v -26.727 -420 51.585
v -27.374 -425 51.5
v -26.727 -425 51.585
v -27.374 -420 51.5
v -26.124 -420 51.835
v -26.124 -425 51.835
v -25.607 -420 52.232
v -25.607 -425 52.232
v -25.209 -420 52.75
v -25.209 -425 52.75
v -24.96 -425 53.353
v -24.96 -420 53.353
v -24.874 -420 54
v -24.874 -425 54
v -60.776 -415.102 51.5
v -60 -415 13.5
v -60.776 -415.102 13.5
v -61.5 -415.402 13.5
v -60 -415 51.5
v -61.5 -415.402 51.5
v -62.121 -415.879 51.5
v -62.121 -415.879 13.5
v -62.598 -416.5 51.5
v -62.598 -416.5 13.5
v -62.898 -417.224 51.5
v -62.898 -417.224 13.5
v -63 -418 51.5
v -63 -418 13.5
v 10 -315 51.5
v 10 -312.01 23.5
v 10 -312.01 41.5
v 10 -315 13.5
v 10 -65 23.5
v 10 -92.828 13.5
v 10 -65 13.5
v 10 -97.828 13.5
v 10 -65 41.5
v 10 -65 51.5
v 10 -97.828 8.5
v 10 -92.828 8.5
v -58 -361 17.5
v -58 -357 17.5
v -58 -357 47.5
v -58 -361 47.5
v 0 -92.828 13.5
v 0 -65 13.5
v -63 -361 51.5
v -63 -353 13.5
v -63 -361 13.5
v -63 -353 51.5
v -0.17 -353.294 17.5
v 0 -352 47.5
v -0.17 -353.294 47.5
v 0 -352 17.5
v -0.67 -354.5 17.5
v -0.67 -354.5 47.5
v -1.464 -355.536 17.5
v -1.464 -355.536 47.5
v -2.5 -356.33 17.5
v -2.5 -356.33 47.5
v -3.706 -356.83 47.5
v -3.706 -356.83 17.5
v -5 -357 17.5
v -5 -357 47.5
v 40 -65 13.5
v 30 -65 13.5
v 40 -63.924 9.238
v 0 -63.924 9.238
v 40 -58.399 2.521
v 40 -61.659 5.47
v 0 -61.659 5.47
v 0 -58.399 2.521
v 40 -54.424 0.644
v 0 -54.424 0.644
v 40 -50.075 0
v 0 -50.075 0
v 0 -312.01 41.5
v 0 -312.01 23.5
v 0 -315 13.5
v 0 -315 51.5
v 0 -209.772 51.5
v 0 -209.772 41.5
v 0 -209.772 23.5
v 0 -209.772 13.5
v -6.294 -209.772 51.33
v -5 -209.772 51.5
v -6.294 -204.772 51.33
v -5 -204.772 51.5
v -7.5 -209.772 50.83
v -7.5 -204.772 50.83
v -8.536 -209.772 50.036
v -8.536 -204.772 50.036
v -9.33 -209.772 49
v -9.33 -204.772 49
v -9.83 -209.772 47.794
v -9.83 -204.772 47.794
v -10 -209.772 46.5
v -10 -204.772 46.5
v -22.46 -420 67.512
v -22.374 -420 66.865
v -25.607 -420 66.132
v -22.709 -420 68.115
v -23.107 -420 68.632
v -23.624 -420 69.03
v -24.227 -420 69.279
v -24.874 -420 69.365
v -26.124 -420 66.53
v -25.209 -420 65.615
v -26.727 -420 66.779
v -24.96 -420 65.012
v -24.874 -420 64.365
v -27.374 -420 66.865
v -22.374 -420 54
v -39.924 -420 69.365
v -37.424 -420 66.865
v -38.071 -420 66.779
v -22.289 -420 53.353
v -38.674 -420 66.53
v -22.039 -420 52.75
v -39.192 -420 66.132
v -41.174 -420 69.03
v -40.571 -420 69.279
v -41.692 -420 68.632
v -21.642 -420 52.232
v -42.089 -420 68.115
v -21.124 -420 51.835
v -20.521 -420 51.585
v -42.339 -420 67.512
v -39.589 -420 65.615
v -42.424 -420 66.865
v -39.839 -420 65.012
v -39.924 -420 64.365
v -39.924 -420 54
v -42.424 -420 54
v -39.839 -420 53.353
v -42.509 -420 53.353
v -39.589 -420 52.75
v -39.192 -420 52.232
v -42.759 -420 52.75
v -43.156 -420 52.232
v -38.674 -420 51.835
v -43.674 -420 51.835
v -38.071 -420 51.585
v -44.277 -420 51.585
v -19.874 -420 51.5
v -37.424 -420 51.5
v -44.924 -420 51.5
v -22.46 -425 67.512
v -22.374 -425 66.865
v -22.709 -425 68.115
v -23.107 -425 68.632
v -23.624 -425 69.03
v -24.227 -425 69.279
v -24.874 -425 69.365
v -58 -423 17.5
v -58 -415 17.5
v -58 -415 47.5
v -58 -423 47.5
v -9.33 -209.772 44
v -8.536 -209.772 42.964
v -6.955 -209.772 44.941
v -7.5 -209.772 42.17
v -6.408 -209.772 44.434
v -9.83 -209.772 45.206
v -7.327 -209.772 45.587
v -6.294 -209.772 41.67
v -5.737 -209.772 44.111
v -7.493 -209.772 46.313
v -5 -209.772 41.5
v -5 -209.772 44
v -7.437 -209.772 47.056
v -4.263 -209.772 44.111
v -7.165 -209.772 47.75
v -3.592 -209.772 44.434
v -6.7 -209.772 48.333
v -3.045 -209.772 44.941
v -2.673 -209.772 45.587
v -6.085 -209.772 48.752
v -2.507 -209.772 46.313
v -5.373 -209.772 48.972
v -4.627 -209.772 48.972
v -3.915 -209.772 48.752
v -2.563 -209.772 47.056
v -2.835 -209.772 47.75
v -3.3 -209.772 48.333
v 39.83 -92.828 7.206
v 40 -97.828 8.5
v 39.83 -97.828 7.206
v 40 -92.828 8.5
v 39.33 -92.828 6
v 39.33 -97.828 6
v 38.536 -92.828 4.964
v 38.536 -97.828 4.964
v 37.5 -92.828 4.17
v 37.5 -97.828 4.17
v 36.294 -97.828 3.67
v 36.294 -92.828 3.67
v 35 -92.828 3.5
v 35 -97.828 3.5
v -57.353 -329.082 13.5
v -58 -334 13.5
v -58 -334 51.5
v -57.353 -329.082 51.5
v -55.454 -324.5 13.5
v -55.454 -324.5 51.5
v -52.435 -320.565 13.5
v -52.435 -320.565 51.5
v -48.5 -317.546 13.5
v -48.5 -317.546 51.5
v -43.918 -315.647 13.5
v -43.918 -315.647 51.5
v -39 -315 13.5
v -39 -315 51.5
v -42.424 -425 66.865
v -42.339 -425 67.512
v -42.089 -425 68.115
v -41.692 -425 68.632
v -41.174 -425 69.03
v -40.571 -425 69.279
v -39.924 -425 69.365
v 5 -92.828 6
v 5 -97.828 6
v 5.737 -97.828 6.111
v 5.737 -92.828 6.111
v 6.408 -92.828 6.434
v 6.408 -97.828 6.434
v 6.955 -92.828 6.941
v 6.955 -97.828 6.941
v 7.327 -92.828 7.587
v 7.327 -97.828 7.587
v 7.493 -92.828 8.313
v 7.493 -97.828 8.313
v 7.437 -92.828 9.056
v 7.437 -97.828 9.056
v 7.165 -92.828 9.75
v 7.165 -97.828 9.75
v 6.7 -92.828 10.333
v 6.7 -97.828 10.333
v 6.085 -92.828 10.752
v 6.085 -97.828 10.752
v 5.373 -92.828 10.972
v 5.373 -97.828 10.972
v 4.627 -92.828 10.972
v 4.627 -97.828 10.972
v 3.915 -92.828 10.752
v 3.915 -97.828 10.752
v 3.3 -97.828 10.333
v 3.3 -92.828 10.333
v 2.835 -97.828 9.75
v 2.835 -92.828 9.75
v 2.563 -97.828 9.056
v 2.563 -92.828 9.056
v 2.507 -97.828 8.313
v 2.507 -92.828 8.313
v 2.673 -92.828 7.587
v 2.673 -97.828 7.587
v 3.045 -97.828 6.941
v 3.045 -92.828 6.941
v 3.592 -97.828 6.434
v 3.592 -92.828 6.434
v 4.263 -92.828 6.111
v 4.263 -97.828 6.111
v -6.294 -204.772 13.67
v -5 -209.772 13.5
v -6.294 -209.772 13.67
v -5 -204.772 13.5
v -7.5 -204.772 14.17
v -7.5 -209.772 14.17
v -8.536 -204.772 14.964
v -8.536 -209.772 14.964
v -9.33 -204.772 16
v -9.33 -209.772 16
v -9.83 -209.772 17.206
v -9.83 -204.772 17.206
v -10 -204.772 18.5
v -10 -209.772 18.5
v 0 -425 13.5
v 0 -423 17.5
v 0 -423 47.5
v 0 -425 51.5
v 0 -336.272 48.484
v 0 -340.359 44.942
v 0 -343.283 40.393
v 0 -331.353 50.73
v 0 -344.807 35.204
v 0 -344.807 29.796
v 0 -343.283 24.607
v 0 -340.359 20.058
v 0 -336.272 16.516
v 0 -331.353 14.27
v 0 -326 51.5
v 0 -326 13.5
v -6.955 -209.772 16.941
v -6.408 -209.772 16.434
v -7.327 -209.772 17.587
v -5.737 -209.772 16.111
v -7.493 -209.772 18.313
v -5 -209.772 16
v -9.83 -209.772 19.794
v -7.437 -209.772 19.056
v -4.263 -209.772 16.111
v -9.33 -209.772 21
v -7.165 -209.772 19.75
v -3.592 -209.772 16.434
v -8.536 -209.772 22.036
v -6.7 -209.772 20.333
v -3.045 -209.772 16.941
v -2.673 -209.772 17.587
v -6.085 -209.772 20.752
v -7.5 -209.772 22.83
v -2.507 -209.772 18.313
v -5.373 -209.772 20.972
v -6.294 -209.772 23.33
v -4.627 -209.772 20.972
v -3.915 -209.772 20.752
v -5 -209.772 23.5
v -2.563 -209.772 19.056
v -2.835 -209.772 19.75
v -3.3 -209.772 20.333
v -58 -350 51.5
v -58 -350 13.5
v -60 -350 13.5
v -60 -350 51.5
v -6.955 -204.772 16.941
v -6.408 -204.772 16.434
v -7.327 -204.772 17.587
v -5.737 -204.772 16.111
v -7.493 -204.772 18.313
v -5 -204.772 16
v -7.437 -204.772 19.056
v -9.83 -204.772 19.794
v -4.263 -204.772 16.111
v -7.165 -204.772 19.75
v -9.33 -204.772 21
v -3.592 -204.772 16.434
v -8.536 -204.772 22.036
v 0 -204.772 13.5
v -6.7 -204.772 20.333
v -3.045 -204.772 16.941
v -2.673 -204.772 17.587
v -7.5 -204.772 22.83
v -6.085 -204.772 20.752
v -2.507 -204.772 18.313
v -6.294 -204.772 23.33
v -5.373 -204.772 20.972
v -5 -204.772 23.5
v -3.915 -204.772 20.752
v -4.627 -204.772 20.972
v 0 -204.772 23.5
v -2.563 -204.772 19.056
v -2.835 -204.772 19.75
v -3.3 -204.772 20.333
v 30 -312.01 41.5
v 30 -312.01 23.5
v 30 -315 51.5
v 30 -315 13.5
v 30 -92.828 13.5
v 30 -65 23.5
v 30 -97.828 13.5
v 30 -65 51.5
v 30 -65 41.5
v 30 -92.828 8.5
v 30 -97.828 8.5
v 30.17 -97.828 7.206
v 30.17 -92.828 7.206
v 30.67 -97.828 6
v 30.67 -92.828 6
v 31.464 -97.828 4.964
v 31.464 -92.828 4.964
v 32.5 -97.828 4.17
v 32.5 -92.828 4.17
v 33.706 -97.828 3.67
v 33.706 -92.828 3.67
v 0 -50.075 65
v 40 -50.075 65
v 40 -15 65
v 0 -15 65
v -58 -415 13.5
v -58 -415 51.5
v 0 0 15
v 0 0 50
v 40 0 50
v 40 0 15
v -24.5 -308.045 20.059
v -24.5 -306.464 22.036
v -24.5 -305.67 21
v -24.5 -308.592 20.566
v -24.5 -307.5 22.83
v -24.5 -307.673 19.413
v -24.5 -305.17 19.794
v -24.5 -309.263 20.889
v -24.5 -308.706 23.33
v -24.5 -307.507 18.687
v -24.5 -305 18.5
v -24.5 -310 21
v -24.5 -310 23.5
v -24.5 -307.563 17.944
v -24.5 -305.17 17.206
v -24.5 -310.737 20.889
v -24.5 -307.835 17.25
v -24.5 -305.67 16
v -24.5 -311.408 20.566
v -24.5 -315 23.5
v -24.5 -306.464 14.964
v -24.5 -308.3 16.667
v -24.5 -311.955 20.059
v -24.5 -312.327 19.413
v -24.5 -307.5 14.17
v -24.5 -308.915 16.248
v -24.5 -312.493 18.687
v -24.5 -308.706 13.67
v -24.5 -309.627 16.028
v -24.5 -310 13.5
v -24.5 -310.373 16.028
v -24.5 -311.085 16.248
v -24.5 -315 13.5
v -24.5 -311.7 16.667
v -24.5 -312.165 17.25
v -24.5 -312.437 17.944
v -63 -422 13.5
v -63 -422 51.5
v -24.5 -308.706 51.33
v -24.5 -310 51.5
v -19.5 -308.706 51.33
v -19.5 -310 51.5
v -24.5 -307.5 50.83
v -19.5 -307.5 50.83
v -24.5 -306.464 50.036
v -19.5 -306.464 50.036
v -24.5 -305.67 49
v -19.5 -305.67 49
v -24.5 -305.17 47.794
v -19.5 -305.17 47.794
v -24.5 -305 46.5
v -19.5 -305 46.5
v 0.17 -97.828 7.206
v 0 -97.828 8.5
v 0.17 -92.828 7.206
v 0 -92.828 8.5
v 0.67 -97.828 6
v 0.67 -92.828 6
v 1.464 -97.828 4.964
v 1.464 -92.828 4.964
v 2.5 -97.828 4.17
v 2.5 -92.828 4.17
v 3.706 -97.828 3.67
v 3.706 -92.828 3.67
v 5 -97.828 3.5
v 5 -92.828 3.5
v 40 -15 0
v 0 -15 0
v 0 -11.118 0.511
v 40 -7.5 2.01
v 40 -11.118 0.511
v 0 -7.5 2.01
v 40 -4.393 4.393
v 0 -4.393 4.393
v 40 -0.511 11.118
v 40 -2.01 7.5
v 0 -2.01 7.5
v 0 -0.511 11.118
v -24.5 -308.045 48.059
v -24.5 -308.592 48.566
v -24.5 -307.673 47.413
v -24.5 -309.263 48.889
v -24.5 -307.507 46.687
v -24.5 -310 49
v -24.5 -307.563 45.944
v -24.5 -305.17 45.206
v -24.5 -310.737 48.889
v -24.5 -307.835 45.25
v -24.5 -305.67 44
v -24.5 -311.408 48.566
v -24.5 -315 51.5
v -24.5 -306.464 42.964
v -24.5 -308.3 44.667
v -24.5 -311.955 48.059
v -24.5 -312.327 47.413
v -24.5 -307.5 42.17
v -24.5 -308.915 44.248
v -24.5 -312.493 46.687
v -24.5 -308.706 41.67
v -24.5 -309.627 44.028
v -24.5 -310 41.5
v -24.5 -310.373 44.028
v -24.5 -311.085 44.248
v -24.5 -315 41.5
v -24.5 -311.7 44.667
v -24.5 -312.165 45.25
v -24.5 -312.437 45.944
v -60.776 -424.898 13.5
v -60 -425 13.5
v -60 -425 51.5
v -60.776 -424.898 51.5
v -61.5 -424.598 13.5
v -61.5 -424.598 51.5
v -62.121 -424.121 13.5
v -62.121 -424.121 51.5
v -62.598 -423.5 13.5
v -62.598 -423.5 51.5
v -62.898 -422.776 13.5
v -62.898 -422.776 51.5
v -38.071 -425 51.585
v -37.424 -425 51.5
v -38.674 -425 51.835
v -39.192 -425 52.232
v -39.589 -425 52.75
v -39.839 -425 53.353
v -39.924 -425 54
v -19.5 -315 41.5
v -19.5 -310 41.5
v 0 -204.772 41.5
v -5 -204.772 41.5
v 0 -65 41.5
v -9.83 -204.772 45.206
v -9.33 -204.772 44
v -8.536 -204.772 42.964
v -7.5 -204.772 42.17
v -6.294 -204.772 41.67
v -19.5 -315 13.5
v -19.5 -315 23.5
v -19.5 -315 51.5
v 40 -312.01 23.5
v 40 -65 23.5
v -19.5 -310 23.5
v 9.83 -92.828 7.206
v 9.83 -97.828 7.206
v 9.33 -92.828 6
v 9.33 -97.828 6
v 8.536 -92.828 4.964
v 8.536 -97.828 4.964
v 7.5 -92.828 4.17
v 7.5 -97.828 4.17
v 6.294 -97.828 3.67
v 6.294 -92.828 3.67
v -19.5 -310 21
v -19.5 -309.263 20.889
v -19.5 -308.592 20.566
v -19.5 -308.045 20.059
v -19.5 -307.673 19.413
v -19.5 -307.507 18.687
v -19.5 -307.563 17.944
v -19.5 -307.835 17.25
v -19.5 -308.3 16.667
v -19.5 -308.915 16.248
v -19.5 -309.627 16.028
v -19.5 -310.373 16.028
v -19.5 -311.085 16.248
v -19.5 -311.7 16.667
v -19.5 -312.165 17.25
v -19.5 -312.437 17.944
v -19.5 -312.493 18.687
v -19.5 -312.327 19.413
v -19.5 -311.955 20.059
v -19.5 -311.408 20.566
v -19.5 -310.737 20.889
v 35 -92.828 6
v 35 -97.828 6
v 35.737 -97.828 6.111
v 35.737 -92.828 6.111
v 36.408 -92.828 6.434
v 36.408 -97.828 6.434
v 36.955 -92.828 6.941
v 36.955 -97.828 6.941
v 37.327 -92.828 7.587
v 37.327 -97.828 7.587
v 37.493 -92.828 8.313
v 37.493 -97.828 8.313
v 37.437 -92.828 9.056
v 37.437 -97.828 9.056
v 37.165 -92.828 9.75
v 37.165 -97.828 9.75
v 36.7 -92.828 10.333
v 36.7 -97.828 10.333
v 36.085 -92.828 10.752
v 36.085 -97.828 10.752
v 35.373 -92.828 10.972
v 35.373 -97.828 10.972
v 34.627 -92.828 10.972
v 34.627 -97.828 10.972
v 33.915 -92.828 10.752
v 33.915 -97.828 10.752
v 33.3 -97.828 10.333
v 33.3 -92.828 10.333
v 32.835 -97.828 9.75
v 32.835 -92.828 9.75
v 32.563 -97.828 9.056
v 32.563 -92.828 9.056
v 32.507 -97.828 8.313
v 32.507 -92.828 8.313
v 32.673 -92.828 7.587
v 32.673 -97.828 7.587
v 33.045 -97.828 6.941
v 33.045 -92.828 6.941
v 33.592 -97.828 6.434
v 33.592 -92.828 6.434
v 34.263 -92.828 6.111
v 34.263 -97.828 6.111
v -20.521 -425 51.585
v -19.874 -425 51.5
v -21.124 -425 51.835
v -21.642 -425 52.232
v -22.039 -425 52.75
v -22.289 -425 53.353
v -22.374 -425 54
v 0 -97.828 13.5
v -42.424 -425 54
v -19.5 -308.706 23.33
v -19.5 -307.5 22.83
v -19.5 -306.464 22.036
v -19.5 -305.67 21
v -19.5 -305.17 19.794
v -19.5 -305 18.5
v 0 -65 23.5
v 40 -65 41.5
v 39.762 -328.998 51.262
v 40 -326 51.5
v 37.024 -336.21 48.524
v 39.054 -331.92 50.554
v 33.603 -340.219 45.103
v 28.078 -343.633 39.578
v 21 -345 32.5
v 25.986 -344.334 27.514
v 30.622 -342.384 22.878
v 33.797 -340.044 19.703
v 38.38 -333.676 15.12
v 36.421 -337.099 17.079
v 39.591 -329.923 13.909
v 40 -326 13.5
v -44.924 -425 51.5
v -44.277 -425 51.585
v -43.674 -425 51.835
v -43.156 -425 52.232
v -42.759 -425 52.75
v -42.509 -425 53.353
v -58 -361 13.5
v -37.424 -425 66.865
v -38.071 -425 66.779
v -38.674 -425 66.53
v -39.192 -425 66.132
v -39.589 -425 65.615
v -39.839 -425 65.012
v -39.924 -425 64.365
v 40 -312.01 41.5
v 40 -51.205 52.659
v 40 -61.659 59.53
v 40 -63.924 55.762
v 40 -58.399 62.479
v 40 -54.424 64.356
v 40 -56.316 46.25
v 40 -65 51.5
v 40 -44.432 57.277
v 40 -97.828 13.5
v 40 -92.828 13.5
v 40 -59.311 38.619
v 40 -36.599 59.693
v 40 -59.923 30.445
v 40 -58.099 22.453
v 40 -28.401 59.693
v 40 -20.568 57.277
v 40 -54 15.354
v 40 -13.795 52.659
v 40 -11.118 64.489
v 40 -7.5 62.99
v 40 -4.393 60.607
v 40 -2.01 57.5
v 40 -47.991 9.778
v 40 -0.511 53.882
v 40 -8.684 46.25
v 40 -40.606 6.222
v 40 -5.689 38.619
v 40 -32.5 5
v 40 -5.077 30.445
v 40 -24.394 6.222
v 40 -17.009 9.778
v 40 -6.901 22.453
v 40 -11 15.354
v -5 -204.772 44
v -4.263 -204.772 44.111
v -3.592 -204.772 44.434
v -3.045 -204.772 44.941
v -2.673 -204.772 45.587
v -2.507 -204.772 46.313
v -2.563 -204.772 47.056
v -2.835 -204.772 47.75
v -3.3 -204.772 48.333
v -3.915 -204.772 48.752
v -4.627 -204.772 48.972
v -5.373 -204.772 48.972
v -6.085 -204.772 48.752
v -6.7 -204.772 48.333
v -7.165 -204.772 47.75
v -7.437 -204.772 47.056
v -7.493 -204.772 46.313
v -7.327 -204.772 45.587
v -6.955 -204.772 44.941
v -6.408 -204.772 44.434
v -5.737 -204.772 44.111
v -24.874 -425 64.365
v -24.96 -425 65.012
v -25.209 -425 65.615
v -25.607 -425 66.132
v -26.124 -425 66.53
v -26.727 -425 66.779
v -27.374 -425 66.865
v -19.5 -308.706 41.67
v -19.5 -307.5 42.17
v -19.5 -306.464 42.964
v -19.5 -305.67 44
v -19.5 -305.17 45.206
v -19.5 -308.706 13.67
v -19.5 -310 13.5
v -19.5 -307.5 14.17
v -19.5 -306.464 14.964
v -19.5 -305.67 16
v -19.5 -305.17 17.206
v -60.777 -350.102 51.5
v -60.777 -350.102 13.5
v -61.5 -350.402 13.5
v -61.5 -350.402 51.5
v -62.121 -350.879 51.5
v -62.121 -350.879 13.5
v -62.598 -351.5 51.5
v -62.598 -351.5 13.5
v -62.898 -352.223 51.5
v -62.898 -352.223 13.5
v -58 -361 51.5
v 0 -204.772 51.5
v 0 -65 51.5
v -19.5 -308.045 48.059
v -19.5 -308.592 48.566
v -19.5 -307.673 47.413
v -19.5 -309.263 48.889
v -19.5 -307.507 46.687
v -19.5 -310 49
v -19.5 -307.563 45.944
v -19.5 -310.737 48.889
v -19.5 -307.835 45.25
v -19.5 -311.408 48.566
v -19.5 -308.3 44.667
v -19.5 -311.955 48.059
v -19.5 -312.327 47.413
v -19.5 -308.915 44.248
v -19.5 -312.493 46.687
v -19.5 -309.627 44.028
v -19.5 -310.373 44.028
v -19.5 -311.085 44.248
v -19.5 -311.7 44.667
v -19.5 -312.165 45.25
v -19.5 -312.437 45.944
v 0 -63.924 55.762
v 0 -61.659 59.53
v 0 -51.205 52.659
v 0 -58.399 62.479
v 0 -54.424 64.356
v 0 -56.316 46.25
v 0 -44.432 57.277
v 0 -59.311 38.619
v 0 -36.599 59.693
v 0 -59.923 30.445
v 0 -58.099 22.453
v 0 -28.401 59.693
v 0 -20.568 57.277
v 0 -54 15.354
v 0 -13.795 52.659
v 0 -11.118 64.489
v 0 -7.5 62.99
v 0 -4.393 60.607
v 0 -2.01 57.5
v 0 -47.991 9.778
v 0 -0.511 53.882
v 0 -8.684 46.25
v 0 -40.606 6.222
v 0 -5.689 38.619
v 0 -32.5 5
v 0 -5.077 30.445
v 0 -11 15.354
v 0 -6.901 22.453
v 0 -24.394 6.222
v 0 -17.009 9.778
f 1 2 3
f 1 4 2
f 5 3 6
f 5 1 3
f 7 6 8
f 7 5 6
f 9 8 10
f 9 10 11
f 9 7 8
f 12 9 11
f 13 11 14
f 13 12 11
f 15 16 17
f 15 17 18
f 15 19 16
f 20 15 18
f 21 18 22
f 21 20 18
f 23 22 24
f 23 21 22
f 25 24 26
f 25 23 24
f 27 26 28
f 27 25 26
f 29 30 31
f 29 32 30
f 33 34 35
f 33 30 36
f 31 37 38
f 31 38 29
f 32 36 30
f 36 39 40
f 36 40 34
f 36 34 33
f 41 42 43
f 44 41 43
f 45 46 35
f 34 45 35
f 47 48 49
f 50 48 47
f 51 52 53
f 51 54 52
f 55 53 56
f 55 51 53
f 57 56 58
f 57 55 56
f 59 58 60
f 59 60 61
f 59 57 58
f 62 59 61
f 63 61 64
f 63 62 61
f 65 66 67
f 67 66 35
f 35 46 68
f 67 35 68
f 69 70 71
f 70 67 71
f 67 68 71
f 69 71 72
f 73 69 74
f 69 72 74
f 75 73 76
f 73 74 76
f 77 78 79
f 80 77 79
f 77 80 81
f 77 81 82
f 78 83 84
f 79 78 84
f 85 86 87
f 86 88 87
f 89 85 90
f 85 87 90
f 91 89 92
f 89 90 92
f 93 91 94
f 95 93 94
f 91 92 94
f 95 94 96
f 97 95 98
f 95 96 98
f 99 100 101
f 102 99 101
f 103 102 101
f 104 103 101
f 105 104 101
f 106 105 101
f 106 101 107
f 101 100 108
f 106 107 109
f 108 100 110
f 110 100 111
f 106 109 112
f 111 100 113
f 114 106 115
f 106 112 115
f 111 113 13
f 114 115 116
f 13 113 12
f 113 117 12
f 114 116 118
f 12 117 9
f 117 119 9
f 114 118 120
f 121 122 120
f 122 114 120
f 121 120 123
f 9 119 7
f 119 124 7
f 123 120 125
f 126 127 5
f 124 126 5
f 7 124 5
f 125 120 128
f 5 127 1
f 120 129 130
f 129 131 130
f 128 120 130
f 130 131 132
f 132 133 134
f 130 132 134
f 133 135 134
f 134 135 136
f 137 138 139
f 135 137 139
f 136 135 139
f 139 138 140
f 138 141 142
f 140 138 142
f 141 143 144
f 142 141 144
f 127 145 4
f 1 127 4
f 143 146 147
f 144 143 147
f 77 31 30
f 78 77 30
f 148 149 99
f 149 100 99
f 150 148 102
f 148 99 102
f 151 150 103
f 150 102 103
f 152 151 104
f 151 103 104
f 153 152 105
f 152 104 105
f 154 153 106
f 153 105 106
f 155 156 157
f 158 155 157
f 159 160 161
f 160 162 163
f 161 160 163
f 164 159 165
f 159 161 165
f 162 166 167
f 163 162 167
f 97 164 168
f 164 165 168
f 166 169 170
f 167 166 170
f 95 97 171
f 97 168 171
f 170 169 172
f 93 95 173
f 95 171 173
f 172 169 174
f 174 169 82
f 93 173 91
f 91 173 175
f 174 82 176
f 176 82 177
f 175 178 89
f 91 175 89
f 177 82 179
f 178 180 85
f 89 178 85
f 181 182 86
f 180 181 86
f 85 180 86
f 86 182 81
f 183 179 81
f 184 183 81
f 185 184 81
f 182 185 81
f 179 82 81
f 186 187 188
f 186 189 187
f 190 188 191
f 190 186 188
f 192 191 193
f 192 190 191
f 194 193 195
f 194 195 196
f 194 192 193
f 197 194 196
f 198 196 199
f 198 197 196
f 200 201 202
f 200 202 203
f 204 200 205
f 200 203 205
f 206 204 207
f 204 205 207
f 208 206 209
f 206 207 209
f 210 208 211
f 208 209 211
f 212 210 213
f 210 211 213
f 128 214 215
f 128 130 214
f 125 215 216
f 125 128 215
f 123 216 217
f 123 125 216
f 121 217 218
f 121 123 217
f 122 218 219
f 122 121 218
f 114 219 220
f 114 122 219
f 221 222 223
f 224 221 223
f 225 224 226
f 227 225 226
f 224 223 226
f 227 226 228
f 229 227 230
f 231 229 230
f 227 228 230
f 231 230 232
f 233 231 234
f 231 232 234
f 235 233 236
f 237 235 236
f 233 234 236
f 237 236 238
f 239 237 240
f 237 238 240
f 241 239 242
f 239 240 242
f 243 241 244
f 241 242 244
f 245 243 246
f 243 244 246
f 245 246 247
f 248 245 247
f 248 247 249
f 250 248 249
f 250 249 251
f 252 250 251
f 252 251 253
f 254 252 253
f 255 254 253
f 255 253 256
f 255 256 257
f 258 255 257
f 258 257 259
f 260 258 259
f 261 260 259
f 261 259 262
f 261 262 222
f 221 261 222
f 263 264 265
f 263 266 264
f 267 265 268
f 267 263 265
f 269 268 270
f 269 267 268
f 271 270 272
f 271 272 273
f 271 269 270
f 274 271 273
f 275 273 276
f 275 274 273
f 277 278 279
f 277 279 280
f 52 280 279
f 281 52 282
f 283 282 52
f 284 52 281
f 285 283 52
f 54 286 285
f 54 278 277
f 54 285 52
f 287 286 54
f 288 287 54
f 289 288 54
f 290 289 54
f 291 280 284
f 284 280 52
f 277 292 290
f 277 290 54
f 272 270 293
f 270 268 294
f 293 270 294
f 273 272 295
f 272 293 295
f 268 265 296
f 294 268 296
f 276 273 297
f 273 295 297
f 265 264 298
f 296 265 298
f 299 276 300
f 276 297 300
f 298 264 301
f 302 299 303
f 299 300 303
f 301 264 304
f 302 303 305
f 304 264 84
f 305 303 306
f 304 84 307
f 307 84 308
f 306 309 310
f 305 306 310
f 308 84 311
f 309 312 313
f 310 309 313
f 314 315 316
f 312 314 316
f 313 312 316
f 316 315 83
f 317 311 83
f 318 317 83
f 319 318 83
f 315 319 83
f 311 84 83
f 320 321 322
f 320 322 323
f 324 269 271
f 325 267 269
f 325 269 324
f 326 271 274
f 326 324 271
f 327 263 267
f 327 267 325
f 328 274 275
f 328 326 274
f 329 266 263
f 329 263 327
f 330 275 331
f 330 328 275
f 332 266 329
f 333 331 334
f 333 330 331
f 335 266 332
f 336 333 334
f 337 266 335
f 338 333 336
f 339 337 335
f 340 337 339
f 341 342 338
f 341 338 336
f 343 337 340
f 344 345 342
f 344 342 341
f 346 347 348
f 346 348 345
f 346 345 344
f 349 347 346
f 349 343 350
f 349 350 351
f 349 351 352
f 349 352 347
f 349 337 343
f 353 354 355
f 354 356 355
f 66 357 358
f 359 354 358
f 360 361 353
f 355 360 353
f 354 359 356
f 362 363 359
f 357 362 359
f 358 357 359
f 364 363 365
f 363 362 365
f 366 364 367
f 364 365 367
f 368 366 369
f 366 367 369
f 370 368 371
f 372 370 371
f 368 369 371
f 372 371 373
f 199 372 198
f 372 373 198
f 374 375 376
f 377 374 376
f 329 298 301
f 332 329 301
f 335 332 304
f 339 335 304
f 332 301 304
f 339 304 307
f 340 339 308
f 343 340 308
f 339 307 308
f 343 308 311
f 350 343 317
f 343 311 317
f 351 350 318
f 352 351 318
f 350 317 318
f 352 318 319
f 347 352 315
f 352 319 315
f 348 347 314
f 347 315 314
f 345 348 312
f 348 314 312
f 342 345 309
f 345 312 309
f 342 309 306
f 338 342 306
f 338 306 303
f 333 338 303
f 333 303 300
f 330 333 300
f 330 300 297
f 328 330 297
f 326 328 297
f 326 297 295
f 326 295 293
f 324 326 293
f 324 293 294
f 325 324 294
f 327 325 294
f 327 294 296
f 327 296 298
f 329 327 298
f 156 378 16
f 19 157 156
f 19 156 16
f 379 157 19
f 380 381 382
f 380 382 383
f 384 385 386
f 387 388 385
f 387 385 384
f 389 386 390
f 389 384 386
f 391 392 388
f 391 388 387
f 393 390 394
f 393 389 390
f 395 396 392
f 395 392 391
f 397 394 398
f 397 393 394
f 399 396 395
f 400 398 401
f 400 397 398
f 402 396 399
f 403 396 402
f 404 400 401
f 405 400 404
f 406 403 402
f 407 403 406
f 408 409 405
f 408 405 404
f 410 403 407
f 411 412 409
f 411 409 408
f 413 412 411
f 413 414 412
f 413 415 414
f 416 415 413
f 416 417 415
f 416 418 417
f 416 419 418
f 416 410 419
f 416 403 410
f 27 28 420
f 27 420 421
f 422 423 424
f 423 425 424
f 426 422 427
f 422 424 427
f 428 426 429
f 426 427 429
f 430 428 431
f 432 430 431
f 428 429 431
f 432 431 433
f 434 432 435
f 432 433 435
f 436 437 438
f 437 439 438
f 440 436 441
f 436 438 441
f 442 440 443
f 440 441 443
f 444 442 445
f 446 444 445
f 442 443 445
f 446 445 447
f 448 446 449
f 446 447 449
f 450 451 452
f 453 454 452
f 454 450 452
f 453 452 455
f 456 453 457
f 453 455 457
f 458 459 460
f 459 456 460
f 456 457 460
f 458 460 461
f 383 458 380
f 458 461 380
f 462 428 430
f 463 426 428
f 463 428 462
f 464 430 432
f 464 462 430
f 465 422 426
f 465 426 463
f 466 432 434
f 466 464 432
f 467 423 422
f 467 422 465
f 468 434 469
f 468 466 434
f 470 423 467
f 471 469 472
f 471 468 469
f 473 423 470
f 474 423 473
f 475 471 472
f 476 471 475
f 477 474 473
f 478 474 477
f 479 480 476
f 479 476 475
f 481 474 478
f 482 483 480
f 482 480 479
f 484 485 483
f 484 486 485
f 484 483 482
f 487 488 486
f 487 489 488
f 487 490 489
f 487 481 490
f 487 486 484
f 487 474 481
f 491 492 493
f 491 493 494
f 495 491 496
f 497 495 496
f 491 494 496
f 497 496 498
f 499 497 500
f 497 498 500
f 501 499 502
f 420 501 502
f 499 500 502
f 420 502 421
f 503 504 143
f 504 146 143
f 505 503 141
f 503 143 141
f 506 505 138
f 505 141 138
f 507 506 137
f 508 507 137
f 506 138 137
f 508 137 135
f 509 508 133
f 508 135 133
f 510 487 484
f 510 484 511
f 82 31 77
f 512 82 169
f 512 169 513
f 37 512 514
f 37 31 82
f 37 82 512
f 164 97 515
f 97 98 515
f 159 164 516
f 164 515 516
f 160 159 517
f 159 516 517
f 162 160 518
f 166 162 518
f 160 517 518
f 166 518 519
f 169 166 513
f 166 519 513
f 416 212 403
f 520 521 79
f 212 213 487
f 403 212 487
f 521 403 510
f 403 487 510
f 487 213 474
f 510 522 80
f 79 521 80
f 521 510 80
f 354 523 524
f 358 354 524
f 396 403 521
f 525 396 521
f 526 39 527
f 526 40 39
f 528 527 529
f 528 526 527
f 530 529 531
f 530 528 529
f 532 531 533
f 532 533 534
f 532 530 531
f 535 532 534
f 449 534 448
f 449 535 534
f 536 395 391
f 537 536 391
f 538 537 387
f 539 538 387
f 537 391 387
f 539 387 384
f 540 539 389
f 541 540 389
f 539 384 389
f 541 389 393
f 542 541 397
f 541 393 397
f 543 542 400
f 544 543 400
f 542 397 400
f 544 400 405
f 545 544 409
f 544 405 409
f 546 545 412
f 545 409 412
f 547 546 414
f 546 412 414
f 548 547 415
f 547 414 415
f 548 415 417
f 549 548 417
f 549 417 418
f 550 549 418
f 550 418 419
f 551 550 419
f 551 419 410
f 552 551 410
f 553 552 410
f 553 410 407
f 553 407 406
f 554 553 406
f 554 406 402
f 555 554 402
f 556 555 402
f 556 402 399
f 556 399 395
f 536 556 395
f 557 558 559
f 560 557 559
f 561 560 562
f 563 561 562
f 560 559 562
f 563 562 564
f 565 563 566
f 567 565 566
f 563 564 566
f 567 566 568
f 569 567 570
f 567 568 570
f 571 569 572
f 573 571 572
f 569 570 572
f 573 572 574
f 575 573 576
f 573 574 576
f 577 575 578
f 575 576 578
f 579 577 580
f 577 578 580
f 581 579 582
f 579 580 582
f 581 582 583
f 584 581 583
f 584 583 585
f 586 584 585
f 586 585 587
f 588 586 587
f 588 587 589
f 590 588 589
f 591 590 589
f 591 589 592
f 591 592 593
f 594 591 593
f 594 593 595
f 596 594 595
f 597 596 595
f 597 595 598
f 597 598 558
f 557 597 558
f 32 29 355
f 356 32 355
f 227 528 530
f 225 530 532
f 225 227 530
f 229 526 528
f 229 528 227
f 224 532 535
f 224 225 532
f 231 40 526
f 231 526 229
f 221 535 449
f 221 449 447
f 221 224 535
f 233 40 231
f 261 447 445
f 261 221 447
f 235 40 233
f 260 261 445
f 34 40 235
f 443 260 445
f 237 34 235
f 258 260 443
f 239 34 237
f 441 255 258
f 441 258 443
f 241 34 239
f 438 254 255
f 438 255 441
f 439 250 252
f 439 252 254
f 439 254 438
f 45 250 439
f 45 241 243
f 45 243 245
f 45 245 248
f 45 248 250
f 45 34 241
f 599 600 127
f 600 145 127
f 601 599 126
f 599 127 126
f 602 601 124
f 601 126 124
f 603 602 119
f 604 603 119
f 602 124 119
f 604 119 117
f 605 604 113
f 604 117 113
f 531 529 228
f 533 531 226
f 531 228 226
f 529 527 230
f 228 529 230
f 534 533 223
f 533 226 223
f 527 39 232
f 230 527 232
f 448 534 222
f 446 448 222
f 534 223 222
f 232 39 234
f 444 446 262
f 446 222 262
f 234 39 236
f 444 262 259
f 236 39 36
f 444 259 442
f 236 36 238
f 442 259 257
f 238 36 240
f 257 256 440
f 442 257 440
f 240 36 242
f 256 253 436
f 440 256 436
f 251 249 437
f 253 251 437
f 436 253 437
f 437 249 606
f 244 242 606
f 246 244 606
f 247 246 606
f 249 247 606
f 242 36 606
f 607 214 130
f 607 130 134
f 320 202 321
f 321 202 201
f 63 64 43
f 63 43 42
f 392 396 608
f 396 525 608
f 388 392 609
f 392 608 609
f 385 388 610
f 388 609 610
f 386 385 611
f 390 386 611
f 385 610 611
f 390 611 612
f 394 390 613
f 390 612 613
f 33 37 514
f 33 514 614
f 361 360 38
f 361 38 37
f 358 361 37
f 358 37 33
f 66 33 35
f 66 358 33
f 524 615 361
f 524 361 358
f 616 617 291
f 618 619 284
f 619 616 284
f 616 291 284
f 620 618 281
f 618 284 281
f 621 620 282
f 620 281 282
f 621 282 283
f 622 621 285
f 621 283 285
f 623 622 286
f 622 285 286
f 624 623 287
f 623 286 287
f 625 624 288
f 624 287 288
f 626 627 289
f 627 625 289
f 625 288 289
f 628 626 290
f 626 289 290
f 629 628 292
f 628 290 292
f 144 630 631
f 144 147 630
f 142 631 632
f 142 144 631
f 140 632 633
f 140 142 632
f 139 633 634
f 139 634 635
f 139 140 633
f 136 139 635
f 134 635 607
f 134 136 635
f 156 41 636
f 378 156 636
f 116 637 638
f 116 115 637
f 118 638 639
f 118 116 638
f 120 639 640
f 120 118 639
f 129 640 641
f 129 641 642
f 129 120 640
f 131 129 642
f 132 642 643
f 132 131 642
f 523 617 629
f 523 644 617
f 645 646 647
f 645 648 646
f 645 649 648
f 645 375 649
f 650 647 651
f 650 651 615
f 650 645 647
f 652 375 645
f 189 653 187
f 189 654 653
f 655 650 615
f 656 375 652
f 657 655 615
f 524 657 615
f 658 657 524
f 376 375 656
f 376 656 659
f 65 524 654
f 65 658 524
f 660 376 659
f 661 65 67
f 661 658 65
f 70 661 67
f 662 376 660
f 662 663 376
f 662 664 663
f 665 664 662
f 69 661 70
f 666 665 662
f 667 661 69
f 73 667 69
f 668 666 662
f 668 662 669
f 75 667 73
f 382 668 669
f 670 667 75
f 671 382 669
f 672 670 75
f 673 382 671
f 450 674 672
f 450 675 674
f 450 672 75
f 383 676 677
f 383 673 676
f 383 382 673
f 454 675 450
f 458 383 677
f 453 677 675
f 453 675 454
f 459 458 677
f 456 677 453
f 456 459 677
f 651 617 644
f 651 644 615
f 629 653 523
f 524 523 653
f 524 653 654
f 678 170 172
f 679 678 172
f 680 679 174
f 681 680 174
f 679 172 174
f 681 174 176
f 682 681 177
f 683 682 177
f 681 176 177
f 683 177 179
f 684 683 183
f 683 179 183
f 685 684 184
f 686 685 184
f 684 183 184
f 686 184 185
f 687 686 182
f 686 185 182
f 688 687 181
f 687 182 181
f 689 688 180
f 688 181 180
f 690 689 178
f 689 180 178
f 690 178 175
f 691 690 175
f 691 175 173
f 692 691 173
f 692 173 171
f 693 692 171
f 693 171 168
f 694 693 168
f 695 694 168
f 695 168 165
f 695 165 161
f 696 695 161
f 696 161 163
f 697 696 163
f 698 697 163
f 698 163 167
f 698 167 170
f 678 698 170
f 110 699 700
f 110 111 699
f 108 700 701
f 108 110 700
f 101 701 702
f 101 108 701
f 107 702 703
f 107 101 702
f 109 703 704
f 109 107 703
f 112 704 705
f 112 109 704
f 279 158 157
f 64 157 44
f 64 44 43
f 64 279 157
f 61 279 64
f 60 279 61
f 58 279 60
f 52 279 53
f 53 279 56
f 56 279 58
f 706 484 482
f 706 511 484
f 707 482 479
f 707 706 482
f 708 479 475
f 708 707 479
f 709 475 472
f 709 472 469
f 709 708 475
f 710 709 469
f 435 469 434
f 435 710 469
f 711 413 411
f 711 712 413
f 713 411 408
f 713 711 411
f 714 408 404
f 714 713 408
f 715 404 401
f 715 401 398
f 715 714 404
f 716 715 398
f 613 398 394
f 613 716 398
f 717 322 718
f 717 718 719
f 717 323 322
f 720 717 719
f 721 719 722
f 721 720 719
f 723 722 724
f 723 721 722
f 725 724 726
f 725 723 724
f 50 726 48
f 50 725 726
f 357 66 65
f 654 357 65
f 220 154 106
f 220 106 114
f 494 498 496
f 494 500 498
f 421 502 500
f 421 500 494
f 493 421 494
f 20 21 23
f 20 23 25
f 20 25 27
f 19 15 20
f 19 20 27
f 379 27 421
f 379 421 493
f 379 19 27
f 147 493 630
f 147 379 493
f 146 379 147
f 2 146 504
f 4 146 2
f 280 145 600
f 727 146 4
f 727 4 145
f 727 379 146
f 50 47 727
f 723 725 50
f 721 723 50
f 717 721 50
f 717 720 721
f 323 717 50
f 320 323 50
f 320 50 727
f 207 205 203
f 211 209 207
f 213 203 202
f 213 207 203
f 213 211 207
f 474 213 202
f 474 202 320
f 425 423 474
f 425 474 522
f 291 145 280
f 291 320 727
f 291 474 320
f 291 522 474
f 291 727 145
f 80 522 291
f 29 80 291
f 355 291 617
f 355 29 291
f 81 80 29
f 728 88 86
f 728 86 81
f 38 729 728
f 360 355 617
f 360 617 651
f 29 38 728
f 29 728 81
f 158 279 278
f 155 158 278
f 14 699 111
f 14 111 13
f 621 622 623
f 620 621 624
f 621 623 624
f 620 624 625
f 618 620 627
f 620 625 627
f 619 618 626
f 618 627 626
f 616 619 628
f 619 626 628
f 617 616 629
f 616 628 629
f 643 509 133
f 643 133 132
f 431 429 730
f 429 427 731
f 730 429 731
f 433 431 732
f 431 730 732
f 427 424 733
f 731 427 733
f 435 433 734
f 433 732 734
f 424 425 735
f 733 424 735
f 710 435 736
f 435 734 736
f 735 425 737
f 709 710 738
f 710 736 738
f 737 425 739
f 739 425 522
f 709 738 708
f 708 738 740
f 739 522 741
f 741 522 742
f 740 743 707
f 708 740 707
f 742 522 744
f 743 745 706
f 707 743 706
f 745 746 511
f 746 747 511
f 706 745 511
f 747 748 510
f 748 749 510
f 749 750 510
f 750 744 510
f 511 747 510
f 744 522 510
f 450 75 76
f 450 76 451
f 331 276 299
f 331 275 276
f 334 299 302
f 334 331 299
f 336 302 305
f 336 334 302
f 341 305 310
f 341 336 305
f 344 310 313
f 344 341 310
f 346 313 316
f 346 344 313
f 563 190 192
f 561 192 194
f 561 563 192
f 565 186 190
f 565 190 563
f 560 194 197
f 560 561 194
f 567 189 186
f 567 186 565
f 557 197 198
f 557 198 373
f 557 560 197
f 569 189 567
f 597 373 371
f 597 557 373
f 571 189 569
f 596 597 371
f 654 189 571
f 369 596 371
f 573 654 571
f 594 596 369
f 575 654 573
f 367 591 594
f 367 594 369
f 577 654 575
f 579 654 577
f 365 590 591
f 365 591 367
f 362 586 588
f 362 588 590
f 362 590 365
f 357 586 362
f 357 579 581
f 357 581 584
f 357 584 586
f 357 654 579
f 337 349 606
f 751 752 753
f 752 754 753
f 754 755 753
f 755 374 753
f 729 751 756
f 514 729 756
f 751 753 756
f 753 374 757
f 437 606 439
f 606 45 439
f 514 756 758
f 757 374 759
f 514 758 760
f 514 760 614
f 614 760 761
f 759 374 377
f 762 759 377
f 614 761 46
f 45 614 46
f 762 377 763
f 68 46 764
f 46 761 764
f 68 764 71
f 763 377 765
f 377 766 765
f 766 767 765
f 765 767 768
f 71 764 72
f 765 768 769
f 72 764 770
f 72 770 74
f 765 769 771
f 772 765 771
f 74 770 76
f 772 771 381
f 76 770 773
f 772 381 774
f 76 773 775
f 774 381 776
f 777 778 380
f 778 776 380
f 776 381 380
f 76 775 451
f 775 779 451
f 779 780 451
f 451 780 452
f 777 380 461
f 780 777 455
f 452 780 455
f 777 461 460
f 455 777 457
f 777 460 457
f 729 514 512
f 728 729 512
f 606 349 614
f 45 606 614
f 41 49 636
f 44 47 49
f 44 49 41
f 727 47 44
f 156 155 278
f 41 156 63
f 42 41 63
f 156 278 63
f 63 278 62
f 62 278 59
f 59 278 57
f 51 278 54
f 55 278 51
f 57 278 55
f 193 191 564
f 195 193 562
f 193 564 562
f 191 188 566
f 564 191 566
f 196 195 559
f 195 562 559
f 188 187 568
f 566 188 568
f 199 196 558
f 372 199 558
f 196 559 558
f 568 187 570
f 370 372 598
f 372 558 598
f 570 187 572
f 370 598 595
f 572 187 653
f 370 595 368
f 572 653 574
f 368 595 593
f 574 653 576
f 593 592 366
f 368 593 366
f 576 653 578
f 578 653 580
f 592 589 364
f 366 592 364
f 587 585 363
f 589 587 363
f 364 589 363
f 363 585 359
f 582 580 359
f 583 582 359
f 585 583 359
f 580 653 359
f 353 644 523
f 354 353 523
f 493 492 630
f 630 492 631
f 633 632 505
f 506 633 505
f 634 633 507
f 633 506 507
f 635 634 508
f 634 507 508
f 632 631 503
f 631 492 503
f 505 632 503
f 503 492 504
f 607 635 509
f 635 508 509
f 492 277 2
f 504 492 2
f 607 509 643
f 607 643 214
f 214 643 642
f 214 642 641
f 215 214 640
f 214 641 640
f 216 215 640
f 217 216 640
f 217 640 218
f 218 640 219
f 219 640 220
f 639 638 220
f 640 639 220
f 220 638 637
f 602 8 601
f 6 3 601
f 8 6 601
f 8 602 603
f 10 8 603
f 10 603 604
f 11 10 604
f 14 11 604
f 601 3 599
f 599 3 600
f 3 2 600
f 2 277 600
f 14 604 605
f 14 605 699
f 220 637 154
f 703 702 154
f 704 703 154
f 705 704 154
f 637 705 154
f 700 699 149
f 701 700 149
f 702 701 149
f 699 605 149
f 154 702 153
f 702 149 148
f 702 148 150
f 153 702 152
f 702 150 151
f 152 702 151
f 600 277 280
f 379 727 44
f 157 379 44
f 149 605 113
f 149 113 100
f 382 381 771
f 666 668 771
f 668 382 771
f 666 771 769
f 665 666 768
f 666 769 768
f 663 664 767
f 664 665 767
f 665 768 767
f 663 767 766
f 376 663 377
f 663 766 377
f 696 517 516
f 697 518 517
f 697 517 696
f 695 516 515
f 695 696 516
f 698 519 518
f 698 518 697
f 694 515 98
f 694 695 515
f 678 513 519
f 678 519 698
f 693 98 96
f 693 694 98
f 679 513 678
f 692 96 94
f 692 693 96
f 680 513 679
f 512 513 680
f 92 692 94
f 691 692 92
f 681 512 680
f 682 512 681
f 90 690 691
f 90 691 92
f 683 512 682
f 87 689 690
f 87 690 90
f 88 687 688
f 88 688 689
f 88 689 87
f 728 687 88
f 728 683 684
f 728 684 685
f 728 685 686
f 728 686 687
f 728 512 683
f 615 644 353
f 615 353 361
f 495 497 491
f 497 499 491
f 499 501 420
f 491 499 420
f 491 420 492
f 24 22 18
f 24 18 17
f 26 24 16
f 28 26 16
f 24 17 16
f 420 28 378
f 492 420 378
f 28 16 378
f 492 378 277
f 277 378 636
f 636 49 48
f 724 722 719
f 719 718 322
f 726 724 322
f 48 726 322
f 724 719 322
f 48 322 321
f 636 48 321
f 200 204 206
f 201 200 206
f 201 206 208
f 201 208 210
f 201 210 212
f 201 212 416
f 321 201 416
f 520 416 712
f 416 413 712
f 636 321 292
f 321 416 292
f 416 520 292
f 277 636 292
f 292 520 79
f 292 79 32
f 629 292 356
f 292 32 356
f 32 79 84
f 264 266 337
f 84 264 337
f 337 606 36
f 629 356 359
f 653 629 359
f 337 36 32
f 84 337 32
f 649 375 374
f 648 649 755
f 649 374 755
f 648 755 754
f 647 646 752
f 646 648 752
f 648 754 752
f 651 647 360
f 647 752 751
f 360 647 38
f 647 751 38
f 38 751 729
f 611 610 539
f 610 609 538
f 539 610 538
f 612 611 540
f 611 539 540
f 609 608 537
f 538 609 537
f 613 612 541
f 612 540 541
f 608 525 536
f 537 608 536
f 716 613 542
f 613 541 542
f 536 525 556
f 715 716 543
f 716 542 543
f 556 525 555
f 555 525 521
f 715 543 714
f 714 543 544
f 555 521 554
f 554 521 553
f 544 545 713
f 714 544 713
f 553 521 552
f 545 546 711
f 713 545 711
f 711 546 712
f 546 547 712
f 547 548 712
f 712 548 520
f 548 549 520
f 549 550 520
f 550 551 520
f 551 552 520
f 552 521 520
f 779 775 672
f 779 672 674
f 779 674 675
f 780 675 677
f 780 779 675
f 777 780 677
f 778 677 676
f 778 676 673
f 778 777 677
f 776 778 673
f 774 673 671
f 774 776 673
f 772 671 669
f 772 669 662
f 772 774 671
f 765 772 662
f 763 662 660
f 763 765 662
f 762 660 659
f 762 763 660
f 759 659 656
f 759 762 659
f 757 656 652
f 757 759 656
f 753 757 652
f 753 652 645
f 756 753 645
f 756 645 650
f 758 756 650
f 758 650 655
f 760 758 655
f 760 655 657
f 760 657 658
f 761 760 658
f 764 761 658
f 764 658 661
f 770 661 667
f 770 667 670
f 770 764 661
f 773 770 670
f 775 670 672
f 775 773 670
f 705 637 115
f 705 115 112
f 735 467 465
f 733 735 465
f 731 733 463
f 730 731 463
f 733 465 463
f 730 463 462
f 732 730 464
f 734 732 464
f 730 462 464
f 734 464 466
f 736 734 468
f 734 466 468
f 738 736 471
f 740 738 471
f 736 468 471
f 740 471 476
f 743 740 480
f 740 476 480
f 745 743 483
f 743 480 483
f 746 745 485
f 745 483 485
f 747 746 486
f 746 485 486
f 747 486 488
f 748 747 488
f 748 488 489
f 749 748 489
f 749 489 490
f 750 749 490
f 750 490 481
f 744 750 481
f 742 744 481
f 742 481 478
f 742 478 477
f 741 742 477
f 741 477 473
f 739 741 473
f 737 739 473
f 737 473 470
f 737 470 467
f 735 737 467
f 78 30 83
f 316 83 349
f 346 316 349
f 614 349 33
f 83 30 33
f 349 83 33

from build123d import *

# Parameters (mm, degrees)
SKETCH1_W              = 65
SKETCH1_H              = 65
SKETCH1_R              = 27.5
SKETCH1_W_2            = 38
SKETCH1_H_2            = 280
BOSS_EXTRUDE1_DEPTH    = 40
FILLET1_R              = 15
SKETCH2_W              = 58
SKETCH2_H              = 100
BOSS_EXTRUDE2_DEPTH    = 38
FILLET2_R              = 19
SKETCH3_W              = 20
SKETCH3_H              = 250
CUT_EXTRUDE1_DEPTH     = 38
SKETCH4_W              = 18
SKETCH4_H              = 247.009867417
CUT_EXTRUDE2_DEPTH     = 92
SKETCH5_W              = 28
SKETCH5_H              = 60
CUT_EXTRUDE3_DEPTH     = 58
SKETCH6_W              = 38
SKETCH6_H              = 3
BOSS_EXTRUDE11_DEPTH   = 5
BOSS_EXTRUDE11_2_DEPTH = 5
FILLET3_R              = 3
FILLET4_R              = 3
SKETCH7_W              = 10
SKETCH7_H              = 5
BOSS_EXTRUDE14_DEPTH   = 10
SKETCH8_R              = 2.5
CUT_EXTRUDE4_DEPTH     = 10
FILLET5_R              = 5
SKETCH9_W              = 10
SKETCH9_H              = 5
BOSS_EXTRUDE15_DEPTH   = 10
FILLET6_R              = 5
SKETCH10_R             = 2.5
CUT_EXTRUDE5_DEPTH     = 10
SKETCH11_W             = 5
SKETCH11_H             = 10
BOSS_EXTRUDE16_DEPTH   = 10
FILLET7_R              = 5
SKETCH12_R             = 2.5
CUT_EXTRUDE7_DEPTH     = 10
FILLET9_R              = 2
SKETCH13_W             = 35.831314296
SKETCH13_H             = 60.586089769
CUT_EXTRUDE8_DEPTH     = 10
SKETCH14_W             = 58
SKETCH14_H             = 38
CUT_EXTRUDE9_DEPTH     = 70
SKETCH15_W             = 58
SKETCH15_H             = 38
BOSS_EXTRUDE17_DEPTH   = 80
SKETCH16_W             = 34
SKETCH16_H             = 70
CUT_EXTRUDE10_DEPTH    = 58
SKETCH17_W             = 5
SKETCH17_H             = 38
BOSS_EXTRUDE18_DEPTH   = 5
SKETCH18_W             = 38
SKETCH18_H             = 10
BOSS_EXTRUDE19_DEPTH   = 5
FILLET10_R             = 3
FILLET11_R             = 5
SKETCH19_W             = 2
SKETCH19_H             = 75
BOSS_EXTRUDE22_DEPTH   = 58
SKETCH26_W             = 30
SKETCH26_H             = 9
BOSS_EXTRUDE23_DEPTH   = 58
FILLET12_R             = 5
SKETCH27_W             = 5
SKETCH27_H             = 38
BOSS_EXTRUDE24_DEPTH   = 3
BOSS_EXTRUDE26_DEPTH   = 5
FILLET13_R             = 2.5
FILLET14_R             = 2.5


# Some blends are built 0.0001 mm under size
with BuildPart() as part:
    # Sketch1 → Boss-Extrude1 (new body)
    # profile 1 of 2: a face of its own
    with BuildSketch(Plane(origin=(0, 0, 0), x_dir=(0, 0, -1), z_dir=(1, 0, 0))):
        with Locations((-32.5, -32.5)):
            Rectangle(SKETCH1_W, SKETCH1_H)
        with Locations((-32.5, -32.5)):
            Circle(SKETCH1_R, mode=Mode.SUBTRACT)
    # profile 2 of 2: a face of its own
    with BuildSketch(Plane(origin=(0, 0, 0), x_dir=(0, 0, -1), z_dir=(1, 0, 0))):
        with Locations((-32.5, -205)):
            Rectangle(SKETCH1_W_2, SKETCH1_H_2)
    extrude(amount=BOSS_EXTRUDE1_DEPTH)

    # Fillet1
    # the kernel refuses this fillet: 15 mm, written as the material it takes off along each edge
    with BuildSketch(Plane(origin=(-37.312028891, -65, 0), x_dir=(0, 1, 0), z_dir=(1, 0, 0))) as fillet1_piece_1:
        with BuildLine():
            CenterArc((14.924811557, 15), FILLET1_R, 185.739170477, 84.260829523)
            Line((0, 13.5), (-0.298496231, 13.47))
            ThreePointArc((-0.298496231, 13.47), (-0.3, 6.75), (-0.3, 0))
            Line((-0.3, 0), (0, -0.3))
            Line((0, -0.3), (14.924811557, -0.3))
            Line((14.924811557, -0.3), (14.924811557, 0))
        make_face()
    extrude(amount=114.624057783, mode=Mode.SUBTRACT)
    with BuildSketch(Plane(origin=(-37.312028891, -65, 65), x_dir=(0, 1, 0), z_dir=(1, 0, 0))) as fillet1_piece_2:
        with BuildLine():
            CenterArc((14.924811557, -15), FILLET1_R, 90, 84.260829523)
            Line((0, -13.5), (-0.298496231, -13.47))
            ThreePointArc((-0.298496231, -13.47), (-0.3, -6.75), (-0.3, 0))
            Line((-0.3, 0), (0, 0.3))
            Line((0, 0.3), (14.924811557, 0.3))
            Line((14.924811557, 0.3), (14.924811557, 0))
        make_face()
    extrude(amount=114.624057783, mode=Mode.SUBTRACT)
    with BuildSketch(Plane(origin=(-37.5, 0, 0), x_dir=(0, 0, 1), z_dir=(1, 0, 0))) as fillet1_piece_3:
        with BuildLine():
            CenterArc((FILLET1_R, FILLET1_R), FILLET1_R, 180, 90)
            Line((0, FILLET1_R), (-FILLET1_R * 0.02, FILLET1_R))
            Line((-FILLET1_R * 0.02, FILLET1_R), (-FILLET1_R * 0.02, -FILLET1_R * 0.02))
            Line((-FILLET1_R * 0.02, -FILLET1_R * 0.02), (FILLET1_R, -FILLET1_R * 0.02))
            Line((FILLET1_R, -FILLET1_R * 0.02), (FILLET1_R, 0))
        make_face()
    extrude(amount=115, mode=Mode.SUBTRACT)
    with BuildSketch(Plane(origin=(-37.5, 0, 65), x_dir=(0, 0, -1), z_dir=(1, 0, 0))) as fillet1_piece_4:
        with BuildLine():
            CenterArc((FILLET1_R, -FILLET1_R), FILLET1_R, 90, 90)
            Line((0, -FILLET1_R), (-FILLET1_R * 0.02, -FILLET1_R))
            Line((-FILLET1_R * 0.02, -FILLET1_R), (-FILLET1_R * 0.02, FILLET1_R * 0.02))
            Line((-FILLET1_R * 0.02, FILLET1_R * 0.02), (FILLET1_R, FILLET1_R * 0.02))
            Line((FILLET1_R, FILLET1_R * 0.02), (FILLET1_R, 0))
        make_face()
    extrude(amount=115, mode=Mode.SUBTRACT)

    # Sketch2 → Boss-Extrude2 (add)
    with BuildSketch(Plane.XY.offset(51.5)):
        with Locations((-29, -365)):
            Rectangle(SKETCH2_W, SKETCH2_H)
    extrude(amount=-BOSS_EXTRUDE2_DEPTH)

    # Fillet2
    # the kernel refuses this fillet: 19 mm, written as the material it adds along each edge
    # the kernel refuses this fillet: 19 mm, written as the material it takes off along each edge
    with BuildSketch(Plane(origin=(0, -345, 13.5), x_dir=(0, 1, 0), z_dir=(1, 0, 0))) as fillet2_2_piece_1:
        with BuildLine():
            CenterArc((FILLET2_R, FILLET2_R), FILLET2_R, 180, 90)
            Line((0, FILLET2_R), (0, 0))
            Line((0, 0), (FILLET2_R, 0))
        make_face()
    extrude(amount=87.5, mode=Mode.SUBTRACT)
    with BuildSketch(Plane(origin=(0, -345, 51.5), x_dir=(0, 1, 0), z_dir=(1, 0, 0))) as fillet2_2_piece_2:
        with BuildLine():
            CenterArc((FILLET2_R, -FILLET2_R), FILLET2_R, 90, 90)
            Line((0, -FILLET2_R), (0, 0))
            Line((0, 0), (FILLET2_R, 0))
        make_face()
    extrude(amount=87.5, mode=Mode.SUBTRACT)
    with BuildSketch(Plane(origin=(40, -345, -34), x_dir=(0, 1, 0), z_dir=(0, 0, 1)), Plane(origin=(-58, -315, 99), x_dir=(1, 0, 0), z_dir=(0, 0, -1))) as fillet2_2_piece_3:
        with BuildLine():
            CenterArc((FILLET2_R, FILLET2_R), FILLET2_R, 180, 90)
            Line((0, FILLET2_R), (0, 0))
            Line((0, 0), (FILLET2_R, 0))
        make_face()
    extrude(amount=133, mode=Mode.SUBTRACT)

    # Sketch3 → Cut-Extrude1 (cut)
    with BuildSketch(Plane.XY.offset(51.5)):
        with Locations((20, -190)):
            Rectangle(SKETCH3_W, SKETCH3_H)
    extrude(amount=-CUT_EXTRUDE1_DEPTH, mode=Mode.SUBTRACT)

    # Sketch4 → Cut-Extrude2 (cut)
    with BuildSketch(Plane(origin=(40, 0, 0), x_dir=(0, 0, -1), z_dir=(1, 0, 0))):
        with Locations((-32.5, -188.504933709)):
            Rectangle(SKETCH4_W, SKETCH4_H)
    extrude(amount=-CUT_EXTRUDE2_DEPTH, mode=Mode.SUBTRACT)

    # Sketch5 → Cut-Extrude3 (cut)
    with BuildSketch(Plane(origin=(0, 0, 0), x_dir=(0, 0, -1), z_dir=(1, 0, 0))):
        with Locations((-32.5, -380)):
            Rectangle(SKETCH5_W, SKETCH5_H)
    extrude(amount=-CUT_EXTRUDE3_DEPTH, mode=Mode.SUBTRACT)

    # Sketch7 → Boss-Extrude14 (add)
    with BuildSketch(Plane.ZY):
        with Locations((18.5, -207.271752894)):
            Rectangle(SKETCH7_W, SKETCH7_H)
        with Locations((46.5, -207.271752894)):
            Rectangle(SKETCH7_W, SKETCH7_H)
    extrude(amount=BOSS_EXTRUDE14_DEPTH)

    # Sketch8 → Cut-Extrude4 (cut)
    with BuildSketch(Plane.XZ.offset(209.771752894)):
        with Locations(Location((-5, 18.5, 0), (0, 0, 270))):
            Circle(SKETCH8_R)
        with Locations(Location((-5, 46.5, 0), (0, 0, 270))):
            Circle(SKETCH8_R)
    extrude(amount=-CUT_EXTRUDE4_DEPTH, mode=Mode.SUBTRACT)

    # Fillet5
    fillet5_edges = [part.edges().sort_by_distance(p)[0] for p in [
        (-10, -207.271752894, 23.5),
        (-10, -207.271752894, 51.5),
        (-10, -207.271752894, 41.5),
        (-10, -207.271752894, 13.5),
    ]]
    fillet(fillet5_edges, radius=FILLET5_R - 0.0001)  # a hair under: the kernel refuses the full size

    # Sketch9 → Boss-Extrude15 (add)
    with BuildSketch(Plane(origin=(0, 0, 13.5), x_dir=(-1, 0, 0), z_dir=(0, 0, -1))):
        with Locations((-35, -95.328363794)):
            Rectangle(SKETCH9_W, SKETCH9_H)
        with Locations((-5, -95.328363794)):
            Rectangle(SKETCH9_W, SKETCH9_H)
    extrude(amount=BOSS_EXTRUDE15_DEPTH)

    # Fillet6
    fillet6_edges = [part.edges().sort_by_distance(p)[0] for p in [
        (40, -95.328363794, 3.5),
        (30, -95.328363794, 3.5),
        (10, -95.328363794, 3.5),
        (0, -95.328363794, 3.5),
    ]]
    fillet(fillet6_edges, radius=FILLET6_R - 0.0001)  # a hair under: the kernel refuses the full size

    # Sketch10 → Cut-Extrude5 (cut)
    with BuildSketch(Plane(origin=(0, -97.828363794, 0), x_dir=(-1, 0, 0), z_dir=(0, -1, 0))):
        with Locations(Location((-35, -8.5, 0), (0, 0, 90))):
            Circle(SKETCH10_R)
        with Locations(Location((-5, -8.5, 0), (0, 0, 90))):
            Circle(SKETCH10_R)
    extrude(amount=-CUT_EXTRUDE5_DEPTH, mode=Mode.SUBTRACT)

    # Sketch11 → Boss-Extrude16 (add)
    with BuildSketch(Plane(origin=(0, -315, 0), x_dir=(1, 0, 0), z_dir=(0, 1, 0))):
        with Locations((-22, -18.5)):
            Rectangle(SKETCH11_W, SKETCH11_H)
        with Locations((-22, -46.5)):
            Rectangle(SKETCH11_W, SKETCH11_H)
    extrude(amount=BOSS_EXTRUDE16_DEPTH)

    # Fillet7
    fillet7_edges = [part.edges().sort_by_distance(p)[0] for p in [
        (-22, -305, 51.5),
        (-22, -305, 13.5),
        (-22, -305, 41.5),
        (-22, -305, 23.5),
    ]]
    fillet(fillet7_edges, radius=FILLET7_R - 0.0001)  # a hair under: the kernel refuses the full size

    # Sketch12 → Cut-Extrude7 (cut)
    with BuildSketch(Plane.ZY.offset(24.5)):
        with Locations((18.5, -310)):
            Circle(SKETCH12_R)
        with Locations((46.5, -310)):
            Circle(SKETCH12_R)
    extrude(amount=-CUT_EXTRUDE7_DEPTH, mode=Mode.SUBTRACT)

    # Fillet9
    fillet9_edges = [part.edges().sort_by_distance(p)[0] for p in [
        (0, -410, 32.5),
        (0, -350, 32.5),
    ]]
    fillet(fillet9_edges, radius=FILLET9_R)

    # Sketch14 → Cut-Extrude9 (cut)
    with BuildSketch(Plane(origin=(0, -415, 0), x_dir=(-1, 0, 0), z_dir=(0, -1, 0))):
        with Locations((29, -32.5)):
            Rectangle(SKETCH14_W, SKETCH14_H)
    extrude(amount=-CUT_EXTRUDE9_DEPTH, mode=Mode.SUBTRACT)



with BuildPart() as body_2:
    # Sketch6 → Boss-Extrude11 (new body)
    with BuildSketch(Plane.ZY.offset(58)):
        with Locations((32.5, -351.5)):
            Rectangle(SKETCH6_W, SKETCH6_H)
    extrude(amount=BOSS_EXTRUDE11_DEPTH)

    # Fillet3
    fillet3_edges = [body_2.edges().sort_by_distance(p)[0] for p in [
        (-63, -350, 32.5),
    ]]
    fillet(fillet3_edges, radius=FILLET3_R - 0.0001)  # a hair under: the kernel refuses the full size


with BuildPart() as body_3:
    # Sketch6 → Boss-Extrude11 2 (new body)
    with BuildSketch(Plane.ZY.offset(58)):
        with Locations((32.5, -408.5)):
            Rectangle(SKETCH6_W, SKETCH6_H)
    extrude(amount=BOSS_EXTRUDE11_2_DEPTH)

    # Fillet4
    fillet4_edges = [body_3.edges().sort_by_distance(p)[0] for p in [
        (-63, -410, 32.5),
    ]]
    fillet(fillet4_edges, radius=FILLET4_R - 0.0001)  # a hair under: the kernel refuses the full size

    # Sketch13 → Cut-Extrude8 (cut)
    with BuildSketch(Plane.XZ.offset(410)):
        with Locations((-75.915657148, 21.206955116)):
            Rectangle(SKETCH13_W, SKETCH13_H)
    extrude(amount=-CUT_EXTRUDE8_DEPTH, mode=Mode.SUBTRACT)


with BuildPart() as part_1:
    add(part.part)

    add(body_2.part)  # Boss-Extrude17 merges body 2
    # Sketch15 → Boss-Extrude17 (add)
    with BuildSketch(Plane(origin=(0, -345, 0), x_dir=(-1, 0, 0), z_dir=(0, -1, 0))):
        with Locations((29, -32.5)):
            Rectangle(SKETCH15_W, SKETCH15_H)
    extrude(amount=BOSS_EXTRUDE17_DEPTH)

    # Sketch16 → Cut-Extrude10 (cut)
    with BuildSketch(Plane(origin=(0, 0, 0), x_dir=(0, 0, -1), z_dir=(1, 0, 0))):
        with Locations((-32.5, -388)):
            Rectangle(SKETCH16_W, SKETCH16_H)
    extrude(amount=-CUT_EXTRUDE10_DEPTH, mode=Mode.SUBTRACT)

    # Sketch17 → Boss-Extrude18 (add)
    with BuildSketch(Plane.XZ.offset(353)):
        with Locations((-60.5, 32.5)):
            Rectangle(SKETCH17_W, SKETCH17_H)
    extrude(amount=BOSS_EXTRUDE18_DEPTH)

    # Sketch18 → Boss-Extrude19 (add)
    with BuildSketch(Plane.ZY.offset(58)):
        with Locations((32.5, -420)):
            Rectangle(SKETCH18_W, SKETCH18_H)
    extrude(amount=BOSS_EXTRUDE19_DEPTH)

    # Fillet10
    fillet10_edges = [part_1.edges().sort_by_distance(p)[0] for p in [
        (-63, -415, 32.5),
        (-63, -425, 32.5),
    ]]
    fillet(fillet10_edges, radius=FILLET10_R)

    # Fillet11
    fillet11_edges = [part_1.edges().sort_by_distance(p)[0] for p in [
        (0, -353, 32.5),
    ]]
    fillet(fillet11_edges, radius=FILLET11_R)

    # Sketch19 → Boss-Extrude22 (add)
    with BuildSketch(Plane(origin=(0, 0, 0), x_dir=(0, 0, -1), z_dir=(1, 0, 0))):
        with Locations((-48.5, -385.5)):
            Rectangle(SKETCH19_W, SKETCH19_H)
        with Locations((-16.5, -385.5)):
            Rectangle(SKETCH19_W, SKETCH19_H)
    extrude(amount=-BOSS_EXTRUDE22_DEPTH)

    # Sketch26 → Boss-Extrude23 (add)
    with BuildSketch(Plane(origin=(0, 0, 0), x_dir=(0, 0, -1), z_dir=(1, 0, 0))):
        with Locations((-32.5, -352.5)):
            Rectangle(SKETCH26_W, SKETCH26_H)
    extrude(amount=-BOSS_EXTRUDE23_DEPTH)

    # Fillet12
    fillet12_edges = [part_1.edges().sort_by_distance(p)[0] for p in [
        (0, -357, 32.5),
    ]]
    fillet(fillet12_edges, radius=FILLET12_R)

    # Sketch27 → Boss-Extrude24 (add)
    with BuildSketch(Plane.XZ.offset(358)):
        with Locations((-60.5, 32.5)):
            Rectangle(SKETCH27_W, SKETCH27_H)
    extrude(amount=BOSS_EXTRUDE24_DEPTH)

    # Sketch30 → Boss-Extrude26 (add)
    with BuildSketch(Plane(origin=(0, -425, 0), x_dir=(-1, 0, 0), z_dir=(0, -1, 0))):
        Polygon((24.87431458, -51.5), (22.37431458, -51.5), (22.37431458, -69.364525512), (42.423825194, -69.364525512), (42.423825194, -51.5), (39.923825194, -51.5), (39.923825194, -66.864525512), (24.87431458, -66.864525512), align=None)
    extrude(amount=-BOSS_EXTRUDE26_DEPTH)

    # Fillet13
    fillet13_edges = [part_1.edges().sort_by_distance(p)[0] for p in [
        (-24.87431458, -422.5, 51.5),
        (-39.923825194, -422.5, 51.5),
        (-42.423825194, -422.5, 51.5),
        (-42.423825194, -422.5, 69.364525512),
        (-22.37431458, -422.5, 69.364525512),
        (-22.37431458, -422.5, 51.5),
    ]]
    fillet(fillet13_edges, radius=FILLET13_R)

    # Fillet14
    fillet14_edges = [part_1.edges().sort_by_distance(p)[0] for p in [
        (-24.87431458, -422.5, 66.864525512),
        (-39.923825194, -422.5, 66.864525512),
    ]]
    fillet(fillet14_edges, radius=FILLET14_R)


solid = part_1.part
